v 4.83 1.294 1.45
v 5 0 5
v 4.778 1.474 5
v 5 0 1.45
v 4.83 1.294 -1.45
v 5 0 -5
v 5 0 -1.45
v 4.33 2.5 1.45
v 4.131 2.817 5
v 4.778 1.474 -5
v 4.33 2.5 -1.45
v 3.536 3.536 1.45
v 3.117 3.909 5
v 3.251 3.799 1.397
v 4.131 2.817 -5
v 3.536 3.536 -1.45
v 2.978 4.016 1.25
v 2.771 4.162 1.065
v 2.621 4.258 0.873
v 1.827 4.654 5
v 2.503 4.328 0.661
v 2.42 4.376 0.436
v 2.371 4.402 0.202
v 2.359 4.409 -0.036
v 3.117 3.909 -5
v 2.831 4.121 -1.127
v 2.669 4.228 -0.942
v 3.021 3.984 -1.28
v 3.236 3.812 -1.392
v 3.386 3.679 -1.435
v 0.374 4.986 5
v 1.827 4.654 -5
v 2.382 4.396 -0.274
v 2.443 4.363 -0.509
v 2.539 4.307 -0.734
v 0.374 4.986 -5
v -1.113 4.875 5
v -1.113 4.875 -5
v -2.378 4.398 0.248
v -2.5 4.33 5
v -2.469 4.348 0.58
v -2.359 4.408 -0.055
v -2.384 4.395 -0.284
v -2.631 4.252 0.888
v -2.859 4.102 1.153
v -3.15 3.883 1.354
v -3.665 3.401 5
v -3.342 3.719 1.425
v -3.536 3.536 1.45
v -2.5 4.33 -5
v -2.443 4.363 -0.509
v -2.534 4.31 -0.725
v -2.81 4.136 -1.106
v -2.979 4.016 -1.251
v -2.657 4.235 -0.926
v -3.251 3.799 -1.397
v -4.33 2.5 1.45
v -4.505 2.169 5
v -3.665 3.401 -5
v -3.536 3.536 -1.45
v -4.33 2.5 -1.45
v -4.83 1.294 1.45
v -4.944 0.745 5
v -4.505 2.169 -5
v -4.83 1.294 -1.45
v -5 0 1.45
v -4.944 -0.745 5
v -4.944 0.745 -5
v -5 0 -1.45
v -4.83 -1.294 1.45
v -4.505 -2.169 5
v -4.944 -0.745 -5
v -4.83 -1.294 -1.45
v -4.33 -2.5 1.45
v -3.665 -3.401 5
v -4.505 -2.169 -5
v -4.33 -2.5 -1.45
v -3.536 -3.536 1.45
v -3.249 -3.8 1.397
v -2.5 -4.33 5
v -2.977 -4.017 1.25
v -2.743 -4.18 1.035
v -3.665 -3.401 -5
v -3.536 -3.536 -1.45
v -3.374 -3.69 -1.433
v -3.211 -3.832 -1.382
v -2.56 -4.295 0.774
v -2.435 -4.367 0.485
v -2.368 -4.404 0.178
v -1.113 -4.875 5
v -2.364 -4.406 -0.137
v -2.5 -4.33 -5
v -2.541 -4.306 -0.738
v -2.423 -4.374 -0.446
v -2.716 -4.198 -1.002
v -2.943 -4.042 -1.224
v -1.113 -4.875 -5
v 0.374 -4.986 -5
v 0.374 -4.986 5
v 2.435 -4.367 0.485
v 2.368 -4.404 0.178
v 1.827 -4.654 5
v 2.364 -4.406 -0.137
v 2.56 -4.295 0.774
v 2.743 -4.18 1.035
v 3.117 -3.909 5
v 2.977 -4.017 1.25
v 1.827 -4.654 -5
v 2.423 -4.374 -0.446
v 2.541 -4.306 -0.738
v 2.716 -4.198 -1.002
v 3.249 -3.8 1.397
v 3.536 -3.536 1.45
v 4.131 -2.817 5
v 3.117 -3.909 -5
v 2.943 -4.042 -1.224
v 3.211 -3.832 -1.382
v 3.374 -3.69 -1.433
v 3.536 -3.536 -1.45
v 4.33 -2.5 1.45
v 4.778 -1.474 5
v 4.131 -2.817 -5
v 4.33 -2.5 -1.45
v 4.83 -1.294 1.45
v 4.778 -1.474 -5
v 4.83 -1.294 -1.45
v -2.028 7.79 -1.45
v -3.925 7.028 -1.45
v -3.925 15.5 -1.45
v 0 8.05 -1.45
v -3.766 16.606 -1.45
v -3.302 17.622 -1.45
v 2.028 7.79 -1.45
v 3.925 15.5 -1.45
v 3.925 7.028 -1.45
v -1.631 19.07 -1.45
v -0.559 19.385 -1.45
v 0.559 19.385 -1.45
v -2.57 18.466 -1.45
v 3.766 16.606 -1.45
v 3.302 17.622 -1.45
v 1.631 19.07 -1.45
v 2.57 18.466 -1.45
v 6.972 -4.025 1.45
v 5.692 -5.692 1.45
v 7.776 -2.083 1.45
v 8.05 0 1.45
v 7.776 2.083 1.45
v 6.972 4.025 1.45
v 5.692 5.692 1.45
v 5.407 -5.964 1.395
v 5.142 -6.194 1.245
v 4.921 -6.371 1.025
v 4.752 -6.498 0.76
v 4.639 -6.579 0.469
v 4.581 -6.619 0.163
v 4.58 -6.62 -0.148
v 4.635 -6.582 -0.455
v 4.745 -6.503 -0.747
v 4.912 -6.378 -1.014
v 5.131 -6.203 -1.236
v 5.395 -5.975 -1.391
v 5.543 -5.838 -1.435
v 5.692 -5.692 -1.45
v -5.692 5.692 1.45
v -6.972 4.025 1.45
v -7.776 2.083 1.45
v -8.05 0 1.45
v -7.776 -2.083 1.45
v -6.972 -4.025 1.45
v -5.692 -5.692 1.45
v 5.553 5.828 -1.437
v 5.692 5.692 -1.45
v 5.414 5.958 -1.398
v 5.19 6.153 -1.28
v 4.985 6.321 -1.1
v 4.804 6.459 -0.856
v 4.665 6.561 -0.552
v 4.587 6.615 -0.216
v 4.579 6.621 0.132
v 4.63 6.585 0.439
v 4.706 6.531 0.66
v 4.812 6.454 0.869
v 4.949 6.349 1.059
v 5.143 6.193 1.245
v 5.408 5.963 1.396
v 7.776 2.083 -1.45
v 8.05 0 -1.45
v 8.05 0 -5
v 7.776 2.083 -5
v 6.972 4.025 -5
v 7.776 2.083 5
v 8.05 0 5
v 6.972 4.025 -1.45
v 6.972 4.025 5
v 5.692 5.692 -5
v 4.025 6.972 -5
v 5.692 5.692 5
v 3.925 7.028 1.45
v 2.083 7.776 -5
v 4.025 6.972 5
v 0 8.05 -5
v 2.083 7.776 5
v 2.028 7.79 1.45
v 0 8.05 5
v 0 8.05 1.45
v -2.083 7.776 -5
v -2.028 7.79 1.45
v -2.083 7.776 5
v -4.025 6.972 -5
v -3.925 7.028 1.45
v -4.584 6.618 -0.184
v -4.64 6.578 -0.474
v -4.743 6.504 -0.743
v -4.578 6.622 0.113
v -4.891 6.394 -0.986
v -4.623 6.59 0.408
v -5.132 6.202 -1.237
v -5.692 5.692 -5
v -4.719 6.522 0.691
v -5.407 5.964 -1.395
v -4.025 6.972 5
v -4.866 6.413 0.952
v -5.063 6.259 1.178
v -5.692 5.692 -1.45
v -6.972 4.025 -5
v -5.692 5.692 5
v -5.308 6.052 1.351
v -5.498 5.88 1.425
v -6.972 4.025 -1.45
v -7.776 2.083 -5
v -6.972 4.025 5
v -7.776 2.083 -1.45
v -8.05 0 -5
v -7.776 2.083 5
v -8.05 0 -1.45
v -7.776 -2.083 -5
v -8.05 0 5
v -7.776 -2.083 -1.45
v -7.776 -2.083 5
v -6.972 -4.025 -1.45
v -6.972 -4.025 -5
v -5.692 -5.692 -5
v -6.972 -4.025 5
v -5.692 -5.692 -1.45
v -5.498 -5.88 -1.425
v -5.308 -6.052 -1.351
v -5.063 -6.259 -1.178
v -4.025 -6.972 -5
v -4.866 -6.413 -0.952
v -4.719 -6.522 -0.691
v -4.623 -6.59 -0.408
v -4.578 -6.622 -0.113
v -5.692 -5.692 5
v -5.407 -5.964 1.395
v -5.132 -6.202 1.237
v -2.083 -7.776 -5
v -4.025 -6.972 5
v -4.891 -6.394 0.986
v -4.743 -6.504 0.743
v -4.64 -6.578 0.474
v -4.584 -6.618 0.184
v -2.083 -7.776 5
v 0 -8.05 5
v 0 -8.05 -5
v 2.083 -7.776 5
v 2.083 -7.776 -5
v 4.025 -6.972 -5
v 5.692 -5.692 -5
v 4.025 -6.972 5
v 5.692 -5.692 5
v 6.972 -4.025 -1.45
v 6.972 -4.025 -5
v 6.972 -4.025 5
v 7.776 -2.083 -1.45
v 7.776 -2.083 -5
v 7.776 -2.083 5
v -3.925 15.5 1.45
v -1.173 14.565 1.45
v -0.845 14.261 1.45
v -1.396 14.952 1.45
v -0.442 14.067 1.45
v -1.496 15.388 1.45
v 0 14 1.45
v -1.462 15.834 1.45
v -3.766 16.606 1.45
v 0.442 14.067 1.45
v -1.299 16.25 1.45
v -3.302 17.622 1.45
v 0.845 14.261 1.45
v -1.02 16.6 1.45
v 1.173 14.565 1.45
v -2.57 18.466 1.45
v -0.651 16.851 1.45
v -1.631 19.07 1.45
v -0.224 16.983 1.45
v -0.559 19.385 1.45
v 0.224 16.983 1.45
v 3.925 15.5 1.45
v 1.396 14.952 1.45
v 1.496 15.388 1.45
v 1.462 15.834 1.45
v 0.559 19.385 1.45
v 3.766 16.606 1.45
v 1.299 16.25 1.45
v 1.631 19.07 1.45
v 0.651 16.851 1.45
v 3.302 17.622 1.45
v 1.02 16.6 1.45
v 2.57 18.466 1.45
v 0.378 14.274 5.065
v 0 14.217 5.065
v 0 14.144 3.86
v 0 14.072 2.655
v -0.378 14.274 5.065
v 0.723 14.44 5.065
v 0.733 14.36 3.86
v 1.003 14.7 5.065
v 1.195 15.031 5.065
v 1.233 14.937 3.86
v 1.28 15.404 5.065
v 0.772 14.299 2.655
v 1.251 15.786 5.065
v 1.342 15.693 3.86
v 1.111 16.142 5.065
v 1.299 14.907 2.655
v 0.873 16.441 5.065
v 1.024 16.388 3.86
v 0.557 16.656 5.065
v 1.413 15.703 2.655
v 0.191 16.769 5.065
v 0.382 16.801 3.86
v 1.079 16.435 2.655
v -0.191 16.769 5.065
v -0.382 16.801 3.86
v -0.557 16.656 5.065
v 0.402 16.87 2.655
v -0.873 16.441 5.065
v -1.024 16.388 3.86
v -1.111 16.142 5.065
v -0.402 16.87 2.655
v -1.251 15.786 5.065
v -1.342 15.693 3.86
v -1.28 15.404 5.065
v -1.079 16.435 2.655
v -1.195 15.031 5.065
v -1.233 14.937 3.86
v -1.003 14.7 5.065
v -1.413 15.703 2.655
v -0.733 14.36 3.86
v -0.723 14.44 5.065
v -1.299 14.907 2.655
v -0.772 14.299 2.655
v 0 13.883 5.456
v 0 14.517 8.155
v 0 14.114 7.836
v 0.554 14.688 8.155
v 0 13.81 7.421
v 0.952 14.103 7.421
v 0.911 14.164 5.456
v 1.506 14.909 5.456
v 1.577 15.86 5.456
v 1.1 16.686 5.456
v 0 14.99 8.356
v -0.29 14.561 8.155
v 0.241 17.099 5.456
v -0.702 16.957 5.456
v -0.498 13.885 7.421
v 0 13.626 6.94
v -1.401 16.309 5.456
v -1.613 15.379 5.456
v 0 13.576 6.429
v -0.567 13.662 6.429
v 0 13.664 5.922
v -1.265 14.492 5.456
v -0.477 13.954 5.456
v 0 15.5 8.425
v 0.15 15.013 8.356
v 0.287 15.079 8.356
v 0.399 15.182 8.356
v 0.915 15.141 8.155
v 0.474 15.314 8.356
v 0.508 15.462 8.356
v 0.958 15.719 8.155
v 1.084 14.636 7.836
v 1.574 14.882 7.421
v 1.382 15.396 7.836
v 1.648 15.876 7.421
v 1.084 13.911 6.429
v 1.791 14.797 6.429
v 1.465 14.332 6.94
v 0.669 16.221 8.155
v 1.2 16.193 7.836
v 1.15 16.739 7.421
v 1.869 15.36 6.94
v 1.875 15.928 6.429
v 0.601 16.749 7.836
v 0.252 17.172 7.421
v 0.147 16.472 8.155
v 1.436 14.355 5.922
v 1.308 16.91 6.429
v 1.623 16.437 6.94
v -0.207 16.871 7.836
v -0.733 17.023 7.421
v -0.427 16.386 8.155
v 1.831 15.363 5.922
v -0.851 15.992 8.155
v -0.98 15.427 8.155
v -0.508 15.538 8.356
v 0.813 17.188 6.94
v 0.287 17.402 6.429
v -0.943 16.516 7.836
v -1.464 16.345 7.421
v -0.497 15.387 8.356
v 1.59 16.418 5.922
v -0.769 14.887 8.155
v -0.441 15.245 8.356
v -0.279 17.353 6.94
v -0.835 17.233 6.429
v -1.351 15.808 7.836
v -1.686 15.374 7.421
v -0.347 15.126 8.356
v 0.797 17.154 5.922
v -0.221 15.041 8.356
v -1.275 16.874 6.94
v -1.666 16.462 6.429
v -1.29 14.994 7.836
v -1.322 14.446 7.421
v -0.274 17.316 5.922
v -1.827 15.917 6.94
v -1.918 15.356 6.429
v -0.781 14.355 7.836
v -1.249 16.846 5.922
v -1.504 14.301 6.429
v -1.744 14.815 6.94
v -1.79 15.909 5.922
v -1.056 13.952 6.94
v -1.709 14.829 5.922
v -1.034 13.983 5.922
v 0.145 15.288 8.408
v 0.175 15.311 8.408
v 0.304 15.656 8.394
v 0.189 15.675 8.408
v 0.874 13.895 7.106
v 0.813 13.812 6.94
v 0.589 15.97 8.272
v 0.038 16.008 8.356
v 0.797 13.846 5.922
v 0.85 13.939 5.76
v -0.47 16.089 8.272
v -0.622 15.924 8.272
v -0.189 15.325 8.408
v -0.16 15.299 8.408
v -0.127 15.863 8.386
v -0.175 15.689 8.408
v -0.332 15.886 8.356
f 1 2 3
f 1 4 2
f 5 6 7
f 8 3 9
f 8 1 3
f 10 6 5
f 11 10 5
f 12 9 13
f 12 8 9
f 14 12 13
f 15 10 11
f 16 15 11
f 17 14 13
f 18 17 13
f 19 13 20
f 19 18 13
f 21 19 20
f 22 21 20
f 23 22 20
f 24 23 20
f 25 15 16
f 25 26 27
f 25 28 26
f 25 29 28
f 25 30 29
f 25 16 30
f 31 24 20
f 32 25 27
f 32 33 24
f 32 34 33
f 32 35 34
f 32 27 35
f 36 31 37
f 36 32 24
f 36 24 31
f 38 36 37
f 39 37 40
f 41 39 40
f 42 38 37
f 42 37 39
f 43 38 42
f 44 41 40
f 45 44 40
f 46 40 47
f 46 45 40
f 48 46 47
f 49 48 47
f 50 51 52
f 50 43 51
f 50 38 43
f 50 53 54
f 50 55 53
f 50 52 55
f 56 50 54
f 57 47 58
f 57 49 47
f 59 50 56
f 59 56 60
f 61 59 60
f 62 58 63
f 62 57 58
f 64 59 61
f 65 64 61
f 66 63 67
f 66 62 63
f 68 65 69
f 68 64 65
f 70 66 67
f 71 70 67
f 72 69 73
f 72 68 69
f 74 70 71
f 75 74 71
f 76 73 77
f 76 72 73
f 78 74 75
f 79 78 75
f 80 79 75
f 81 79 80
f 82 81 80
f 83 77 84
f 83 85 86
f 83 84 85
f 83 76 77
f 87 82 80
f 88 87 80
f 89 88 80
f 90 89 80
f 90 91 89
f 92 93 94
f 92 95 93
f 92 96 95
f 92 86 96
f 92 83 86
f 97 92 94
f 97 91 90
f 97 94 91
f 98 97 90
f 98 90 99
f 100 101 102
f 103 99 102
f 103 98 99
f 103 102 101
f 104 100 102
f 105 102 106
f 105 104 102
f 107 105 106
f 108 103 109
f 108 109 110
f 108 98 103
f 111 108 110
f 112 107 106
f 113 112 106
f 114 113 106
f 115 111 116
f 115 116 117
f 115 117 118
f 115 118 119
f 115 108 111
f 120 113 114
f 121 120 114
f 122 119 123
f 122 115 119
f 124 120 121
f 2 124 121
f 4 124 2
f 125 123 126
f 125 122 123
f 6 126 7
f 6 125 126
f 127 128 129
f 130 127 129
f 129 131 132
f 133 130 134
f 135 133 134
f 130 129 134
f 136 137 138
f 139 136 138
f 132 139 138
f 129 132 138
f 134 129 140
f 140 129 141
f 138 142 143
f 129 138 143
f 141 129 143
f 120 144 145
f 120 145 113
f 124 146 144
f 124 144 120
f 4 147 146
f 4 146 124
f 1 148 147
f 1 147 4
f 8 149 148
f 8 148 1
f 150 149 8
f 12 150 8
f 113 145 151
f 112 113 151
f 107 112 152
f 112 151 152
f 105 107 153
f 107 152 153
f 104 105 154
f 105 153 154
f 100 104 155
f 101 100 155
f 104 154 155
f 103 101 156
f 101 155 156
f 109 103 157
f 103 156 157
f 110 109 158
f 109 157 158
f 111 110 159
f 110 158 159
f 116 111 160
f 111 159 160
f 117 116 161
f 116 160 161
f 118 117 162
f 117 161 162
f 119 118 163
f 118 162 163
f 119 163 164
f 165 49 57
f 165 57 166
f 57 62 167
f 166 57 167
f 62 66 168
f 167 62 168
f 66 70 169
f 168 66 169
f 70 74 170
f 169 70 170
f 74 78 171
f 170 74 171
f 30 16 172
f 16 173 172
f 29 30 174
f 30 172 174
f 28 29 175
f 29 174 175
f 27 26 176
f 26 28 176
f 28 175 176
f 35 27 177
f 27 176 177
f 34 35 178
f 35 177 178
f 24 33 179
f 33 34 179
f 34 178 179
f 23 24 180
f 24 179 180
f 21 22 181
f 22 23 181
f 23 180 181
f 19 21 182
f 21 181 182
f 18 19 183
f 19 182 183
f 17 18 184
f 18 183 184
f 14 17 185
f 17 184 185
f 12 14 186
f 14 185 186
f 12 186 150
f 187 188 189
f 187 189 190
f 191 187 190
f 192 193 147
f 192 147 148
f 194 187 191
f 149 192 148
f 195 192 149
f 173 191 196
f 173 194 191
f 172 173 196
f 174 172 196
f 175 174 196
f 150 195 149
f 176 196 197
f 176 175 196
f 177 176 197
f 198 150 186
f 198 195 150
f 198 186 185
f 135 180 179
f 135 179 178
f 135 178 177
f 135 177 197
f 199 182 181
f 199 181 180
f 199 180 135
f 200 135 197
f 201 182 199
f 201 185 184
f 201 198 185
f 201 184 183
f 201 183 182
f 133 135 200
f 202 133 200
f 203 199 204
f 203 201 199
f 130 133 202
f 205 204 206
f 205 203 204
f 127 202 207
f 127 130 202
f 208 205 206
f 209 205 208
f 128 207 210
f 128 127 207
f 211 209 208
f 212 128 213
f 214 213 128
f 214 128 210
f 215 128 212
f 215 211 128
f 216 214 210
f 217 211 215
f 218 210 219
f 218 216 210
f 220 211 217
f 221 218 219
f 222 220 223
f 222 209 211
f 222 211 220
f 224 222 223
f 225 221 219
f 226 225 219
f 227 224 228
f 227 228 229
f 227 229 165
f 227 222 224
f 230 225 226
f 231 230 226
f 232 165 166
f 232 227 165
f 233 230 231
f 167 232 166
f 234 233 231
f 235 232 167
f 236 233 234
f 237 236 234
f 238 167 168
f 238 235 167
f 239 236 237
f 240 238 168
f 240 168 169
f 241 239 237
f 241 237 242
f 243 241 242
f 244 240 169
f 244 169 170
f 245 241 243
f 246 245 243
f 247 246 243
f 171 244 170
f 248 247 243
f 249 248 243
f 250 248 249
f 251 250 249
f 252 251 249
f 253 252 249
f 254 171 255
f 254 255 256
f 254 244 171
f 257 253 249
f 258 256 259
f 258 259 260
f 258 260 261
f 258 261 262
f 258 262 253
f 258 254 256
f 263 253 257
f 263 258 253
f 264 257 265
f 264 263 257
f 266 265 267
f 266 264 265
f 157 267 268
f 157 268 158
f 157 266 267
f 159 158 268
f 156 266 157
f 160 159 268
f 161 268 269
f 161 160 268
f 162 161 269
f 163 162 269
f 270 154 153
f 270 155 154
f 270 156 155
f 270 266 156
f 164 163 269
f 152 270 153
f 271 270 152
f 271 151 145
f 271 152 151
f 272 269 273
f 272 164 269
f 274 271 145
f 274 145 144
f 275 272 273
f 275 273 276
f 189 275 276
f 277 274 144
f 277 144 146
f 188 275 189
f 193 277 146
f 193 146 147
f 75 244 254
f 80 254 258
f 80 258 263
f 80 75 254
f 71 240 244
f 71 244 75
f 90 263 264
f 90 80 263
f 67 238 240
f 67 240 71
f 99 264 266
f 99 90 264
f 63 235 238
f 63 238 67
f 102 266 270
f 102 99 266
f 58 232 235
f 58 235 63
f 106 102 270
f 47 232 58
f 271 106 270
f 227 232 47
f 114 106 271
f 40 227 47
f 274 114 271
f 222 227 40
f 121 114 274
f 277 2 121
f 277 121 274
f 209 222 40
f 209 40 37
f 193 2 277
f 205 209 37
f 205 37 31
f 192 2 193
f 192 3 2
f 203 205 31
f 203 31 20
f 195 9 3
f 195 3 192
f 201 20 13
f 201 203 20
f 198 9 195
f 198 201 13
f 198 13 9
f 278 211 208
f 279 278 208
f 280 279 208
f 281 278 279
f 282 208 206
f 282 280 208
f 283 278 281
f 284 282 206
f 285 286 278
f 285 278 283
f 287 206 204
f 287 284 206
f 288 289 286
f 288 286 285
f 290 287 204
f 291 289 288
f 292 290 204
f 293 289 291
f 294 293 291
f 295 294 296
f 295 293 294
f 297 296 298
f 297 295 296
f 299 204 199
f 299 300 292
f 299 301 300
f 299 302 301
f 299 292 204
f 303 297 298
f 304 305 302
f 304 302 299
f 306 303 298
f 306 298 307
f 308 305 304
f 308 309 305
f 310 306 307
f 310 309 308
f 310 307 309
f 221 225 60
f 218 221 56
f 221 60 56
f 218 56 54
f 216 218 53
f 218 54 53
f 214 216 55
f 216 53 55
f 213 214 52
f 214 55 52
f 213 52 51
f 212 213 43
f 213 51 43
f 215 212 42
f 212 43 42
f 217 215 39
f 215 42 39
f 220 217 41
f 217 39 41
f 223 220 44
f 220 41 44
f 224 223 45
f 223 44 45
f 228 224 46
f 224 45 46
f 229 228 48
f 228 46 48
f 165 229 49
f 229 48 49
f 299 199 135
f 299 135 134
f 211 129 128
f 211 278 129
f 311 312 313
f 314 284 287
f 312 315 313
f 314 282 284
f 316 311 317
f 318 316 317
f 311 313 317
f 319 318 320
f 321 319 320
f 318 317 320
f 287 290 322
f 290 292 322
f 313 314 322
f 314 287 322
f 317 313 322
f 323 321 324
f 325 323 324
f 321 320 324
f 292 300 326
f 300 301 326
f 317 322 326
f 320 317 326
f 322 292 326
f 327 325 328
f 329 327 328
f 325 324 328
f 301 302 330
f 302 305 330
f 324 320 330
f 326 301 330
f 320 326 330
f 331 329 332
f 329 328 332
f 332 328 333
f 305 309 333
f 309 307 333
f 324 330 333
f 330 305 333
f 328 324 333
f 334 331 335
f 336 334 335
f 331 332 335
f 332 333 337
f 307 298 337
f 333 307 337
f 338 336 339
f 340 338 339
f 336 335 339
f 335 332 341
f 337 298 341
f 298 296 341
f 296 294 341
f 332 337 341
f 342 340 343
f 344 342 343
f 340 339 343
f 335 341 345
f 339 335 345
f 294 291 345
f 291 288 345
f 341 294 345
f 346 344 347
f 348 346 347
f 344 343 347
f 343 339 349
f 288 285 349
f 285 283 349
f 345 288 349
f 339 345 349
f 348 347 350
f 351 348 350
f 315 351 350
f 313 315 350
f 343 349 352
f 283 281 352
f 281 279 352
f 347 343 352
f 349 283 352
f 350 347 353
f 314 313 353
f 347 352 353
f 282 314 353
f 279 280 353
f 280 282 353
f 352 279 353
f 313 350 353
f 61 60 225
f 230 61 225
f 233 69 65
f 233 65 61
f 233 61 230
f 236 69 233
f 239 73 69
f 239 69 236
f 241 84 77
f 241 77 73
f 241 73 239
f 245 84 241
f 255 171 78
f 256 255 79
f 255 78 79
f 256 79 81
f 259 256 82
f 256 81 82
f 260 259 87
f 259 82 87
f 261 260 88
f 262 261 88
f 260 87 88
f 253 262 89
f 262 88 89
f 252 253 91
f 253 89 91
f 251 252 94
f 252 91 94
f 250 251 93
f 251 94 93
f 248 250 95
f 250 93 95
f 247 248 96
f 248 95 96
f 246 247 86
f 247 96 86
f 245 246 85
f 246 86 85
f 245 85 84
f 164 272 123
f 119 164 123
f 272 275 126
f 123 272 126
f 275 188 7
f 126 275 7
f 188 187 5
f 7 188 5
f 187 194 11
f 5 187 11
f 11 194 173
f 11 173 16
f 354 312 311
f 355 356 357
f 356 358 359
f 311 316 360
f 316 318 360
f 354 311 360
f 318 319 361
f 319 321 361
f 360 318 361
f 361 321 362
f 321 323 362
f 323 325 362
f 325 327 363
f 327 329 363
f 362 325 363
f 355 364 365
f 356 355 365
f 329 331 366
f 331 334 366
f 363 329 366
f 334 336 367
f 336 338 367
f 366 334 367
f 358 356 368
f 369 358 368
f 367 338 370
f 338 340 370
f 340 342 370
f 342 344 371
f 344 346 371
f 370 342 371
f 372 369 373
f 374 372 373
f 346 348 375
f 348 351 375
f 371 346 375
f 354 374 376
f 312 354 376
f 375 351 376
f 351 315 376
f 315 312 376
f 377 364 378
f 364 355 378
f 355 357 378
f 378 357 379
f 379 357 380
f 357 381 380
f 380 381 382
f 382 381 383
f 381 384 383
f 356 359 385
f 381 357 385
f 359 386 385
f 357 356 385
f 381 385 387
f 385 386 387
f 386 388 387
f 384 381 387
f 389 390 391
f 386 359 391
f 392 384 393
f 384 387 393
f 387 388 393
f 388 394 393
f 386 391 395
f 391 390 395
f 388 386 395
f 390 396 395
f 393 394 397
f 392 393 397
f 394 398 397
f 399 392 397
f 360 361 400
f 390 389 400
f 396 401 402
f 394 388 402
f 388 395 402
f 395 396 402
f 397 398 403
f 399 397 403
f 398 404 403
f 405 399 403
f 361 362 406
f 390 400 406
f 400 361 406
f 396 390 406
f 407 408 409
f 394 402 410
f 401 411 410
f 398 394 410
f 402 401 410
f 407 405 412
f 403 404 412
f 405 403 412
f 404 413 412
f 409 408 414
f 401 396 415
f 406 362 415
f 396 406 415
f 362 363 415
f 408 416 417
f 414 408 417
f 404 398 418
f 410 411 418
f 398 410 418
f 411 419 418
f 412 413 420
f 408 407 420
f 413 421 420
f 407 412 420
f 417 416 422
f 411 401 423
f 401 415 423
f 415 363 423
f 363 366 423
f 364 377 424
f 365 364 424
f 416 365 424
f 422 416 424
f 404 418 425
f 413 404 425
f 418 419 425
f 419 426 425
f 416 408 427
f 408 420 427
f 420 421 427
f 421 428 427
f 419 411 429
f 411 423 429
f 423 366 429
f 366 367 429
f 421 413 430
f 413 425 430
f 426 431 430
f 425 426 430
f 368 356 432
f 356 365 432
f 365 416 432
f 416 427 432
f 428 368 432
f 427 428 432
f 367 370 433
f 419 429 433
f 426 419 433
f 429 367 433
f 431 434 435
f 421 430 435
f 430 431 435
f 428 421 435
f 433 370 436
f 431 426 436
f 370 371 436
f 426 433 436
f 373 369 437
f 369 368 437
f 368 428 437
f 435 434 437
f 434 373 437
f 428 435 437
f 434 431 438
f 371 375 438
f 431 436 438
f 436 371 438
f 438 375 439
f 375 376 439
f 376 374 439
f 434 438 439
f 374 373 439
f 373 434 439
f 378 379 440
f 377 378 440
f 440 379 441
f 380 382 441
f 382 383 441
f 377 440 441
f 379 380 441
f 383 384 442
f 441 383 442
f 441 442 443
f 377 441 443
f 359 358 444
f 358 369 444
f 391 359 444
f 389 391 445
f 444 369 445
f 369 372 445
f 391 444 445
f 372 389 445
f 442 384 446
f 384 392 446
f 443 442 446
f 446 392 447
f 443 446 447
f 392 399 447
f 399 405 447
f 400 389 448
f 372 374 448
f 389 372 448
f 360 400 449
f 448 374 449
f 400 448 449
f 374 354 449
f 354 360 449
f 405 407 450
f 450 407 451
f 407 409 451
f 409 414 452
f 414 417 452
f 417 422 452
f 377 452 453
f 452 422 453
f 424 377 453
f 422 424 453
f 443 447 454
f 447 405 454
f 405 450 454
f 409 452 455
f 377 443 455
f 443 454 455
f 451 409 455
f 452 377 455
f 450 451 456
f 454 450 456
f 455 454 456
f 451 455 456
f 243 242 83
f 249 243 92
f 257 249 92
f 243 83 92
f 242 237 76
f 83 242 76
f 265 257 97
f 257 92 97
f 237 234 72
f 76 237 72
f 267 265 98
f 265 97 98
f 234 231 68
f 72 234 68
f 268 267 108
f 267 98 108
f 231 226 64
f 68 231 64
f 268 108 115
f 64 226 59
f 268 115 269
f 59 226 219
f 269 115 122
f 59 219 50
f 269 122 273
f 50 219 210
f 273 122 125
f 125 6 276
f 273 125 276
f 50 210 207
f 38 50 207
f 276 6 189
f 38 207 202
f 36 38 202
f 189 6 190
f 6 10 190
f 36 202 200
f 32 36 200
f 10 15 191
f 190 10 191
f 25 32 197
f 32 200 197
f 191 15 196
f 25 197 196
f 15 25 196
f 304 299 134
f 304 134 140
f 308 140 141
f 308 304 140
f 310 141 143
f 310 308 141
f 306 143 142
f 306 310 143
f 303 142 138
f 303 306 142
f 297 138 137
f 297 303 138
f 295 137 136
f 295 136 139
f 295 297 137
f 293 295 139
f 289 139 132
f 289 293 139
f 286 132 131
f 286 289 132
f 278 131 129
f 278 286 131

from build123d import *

# Parameters (mm, degrees)
F1_DEPTH  = 1.45
F2_R      = 8.05
F2_R_2    = 5
F3_DEPTH  = 5
F4_W      = 3.1
F4_H      = 2.9
F6_ANGLE  = -90
F11_R     = 1.45
F12_DEPTH = 25
F14_R     = 1.45
F15_DEPTH = 12.5


with BuildPart() as f1:
    # F0 (on Top) → F1 (new body, symmetric)
    with BuildSketch(Plane.XY):
        with BuildLine():
            ThreePointArc((-3.925, 7.028291), (0, 8.05), (3.925, 7.028291))
            Line((3.925, 7.028291), (3.925, 15.5))
            ThreePointArc((3.925, 15.5), (0, 19.425), (-3.925, 15.5))
            Line((-3.925, 15.5), (-3.925, 7.028291))
        make_face()
    extrude(amount=F1_DEPTH, both=True)

    # F2 (on Top) → F3 (join, symmetric)
    with BuildSketch(Plane.XY):
        Circle(F2_R)
        Circle(F2_R_2, mode=Mode.SUBTRACT)
    extrude(amount=F3_DEPTH, both=True)

    # F4 (on Front) → F6 (revolve, symmetric, cut)
    with BuildSketch(Plane.XZ) as f6_sk:
        with Locations((-6.5, 0)):
            Rectangle(F4_W, F4_H)
        with Locations((6.5, 0)):
            Rectangle(F4_W, F4_H)
    revolve(axis=Axis((0, 0, 0.165465), (0, 0, 1)), revolution_arc=F6_ANGLE / 2, mode=Mode.SUBTRACT)
    revolve(f6_sk.sketch, axis=Axis((0, 0, 0.165465), (0, 0, -1)), revolution_arc=F6_ANGLE / 2, mode=Mode.SUBTRACT)

    # F7 (on Right) → F8 (revolve)
    with BuildSketch(Plane.YZ):
        with BuildLine():
            Line((14, 1.45), (15.5, 1.45))
            Line((15.5, 1.45), (15.5, 6.5))
            Line((15.5, 6.5), (15.5, 8.425))
            ThreePointArc((15.5, 8.425), (13.701718, 7.186883), (14.216667, 5.06519))
            Line((14.216667, 5.06519), (14, 1.45))
        make_face()
    revolve(axis=Axis((0, 15.5, 3.25), (0, 0, 1)))

    # F11 (on face) → F12 (cut)
    with BuildSketch(Plane(origin=(7.946074, 7.946074, 0), x_dir=(-0.707107, 0.707107, 0), z_dir=(0.707107, 0.707107, 0))):
        Circle(F11_R)
    extrude(amount=-F12_DEPTH, mode=Mode.SUBTRACT)

    # F14 (on face) → F15 (cut, symmetric)
    with BuildSketch(Plane(origin=(0, 0, 0), x_dir=(0.707107, 0.707107, 0), z_dir=(0.707107, -0.707107, 0))):
        Circle(F14_R)
    extrude(amount=F15_DEPTH, both=True, mode=Mode.SUBTRACT)


solid = f1.part
